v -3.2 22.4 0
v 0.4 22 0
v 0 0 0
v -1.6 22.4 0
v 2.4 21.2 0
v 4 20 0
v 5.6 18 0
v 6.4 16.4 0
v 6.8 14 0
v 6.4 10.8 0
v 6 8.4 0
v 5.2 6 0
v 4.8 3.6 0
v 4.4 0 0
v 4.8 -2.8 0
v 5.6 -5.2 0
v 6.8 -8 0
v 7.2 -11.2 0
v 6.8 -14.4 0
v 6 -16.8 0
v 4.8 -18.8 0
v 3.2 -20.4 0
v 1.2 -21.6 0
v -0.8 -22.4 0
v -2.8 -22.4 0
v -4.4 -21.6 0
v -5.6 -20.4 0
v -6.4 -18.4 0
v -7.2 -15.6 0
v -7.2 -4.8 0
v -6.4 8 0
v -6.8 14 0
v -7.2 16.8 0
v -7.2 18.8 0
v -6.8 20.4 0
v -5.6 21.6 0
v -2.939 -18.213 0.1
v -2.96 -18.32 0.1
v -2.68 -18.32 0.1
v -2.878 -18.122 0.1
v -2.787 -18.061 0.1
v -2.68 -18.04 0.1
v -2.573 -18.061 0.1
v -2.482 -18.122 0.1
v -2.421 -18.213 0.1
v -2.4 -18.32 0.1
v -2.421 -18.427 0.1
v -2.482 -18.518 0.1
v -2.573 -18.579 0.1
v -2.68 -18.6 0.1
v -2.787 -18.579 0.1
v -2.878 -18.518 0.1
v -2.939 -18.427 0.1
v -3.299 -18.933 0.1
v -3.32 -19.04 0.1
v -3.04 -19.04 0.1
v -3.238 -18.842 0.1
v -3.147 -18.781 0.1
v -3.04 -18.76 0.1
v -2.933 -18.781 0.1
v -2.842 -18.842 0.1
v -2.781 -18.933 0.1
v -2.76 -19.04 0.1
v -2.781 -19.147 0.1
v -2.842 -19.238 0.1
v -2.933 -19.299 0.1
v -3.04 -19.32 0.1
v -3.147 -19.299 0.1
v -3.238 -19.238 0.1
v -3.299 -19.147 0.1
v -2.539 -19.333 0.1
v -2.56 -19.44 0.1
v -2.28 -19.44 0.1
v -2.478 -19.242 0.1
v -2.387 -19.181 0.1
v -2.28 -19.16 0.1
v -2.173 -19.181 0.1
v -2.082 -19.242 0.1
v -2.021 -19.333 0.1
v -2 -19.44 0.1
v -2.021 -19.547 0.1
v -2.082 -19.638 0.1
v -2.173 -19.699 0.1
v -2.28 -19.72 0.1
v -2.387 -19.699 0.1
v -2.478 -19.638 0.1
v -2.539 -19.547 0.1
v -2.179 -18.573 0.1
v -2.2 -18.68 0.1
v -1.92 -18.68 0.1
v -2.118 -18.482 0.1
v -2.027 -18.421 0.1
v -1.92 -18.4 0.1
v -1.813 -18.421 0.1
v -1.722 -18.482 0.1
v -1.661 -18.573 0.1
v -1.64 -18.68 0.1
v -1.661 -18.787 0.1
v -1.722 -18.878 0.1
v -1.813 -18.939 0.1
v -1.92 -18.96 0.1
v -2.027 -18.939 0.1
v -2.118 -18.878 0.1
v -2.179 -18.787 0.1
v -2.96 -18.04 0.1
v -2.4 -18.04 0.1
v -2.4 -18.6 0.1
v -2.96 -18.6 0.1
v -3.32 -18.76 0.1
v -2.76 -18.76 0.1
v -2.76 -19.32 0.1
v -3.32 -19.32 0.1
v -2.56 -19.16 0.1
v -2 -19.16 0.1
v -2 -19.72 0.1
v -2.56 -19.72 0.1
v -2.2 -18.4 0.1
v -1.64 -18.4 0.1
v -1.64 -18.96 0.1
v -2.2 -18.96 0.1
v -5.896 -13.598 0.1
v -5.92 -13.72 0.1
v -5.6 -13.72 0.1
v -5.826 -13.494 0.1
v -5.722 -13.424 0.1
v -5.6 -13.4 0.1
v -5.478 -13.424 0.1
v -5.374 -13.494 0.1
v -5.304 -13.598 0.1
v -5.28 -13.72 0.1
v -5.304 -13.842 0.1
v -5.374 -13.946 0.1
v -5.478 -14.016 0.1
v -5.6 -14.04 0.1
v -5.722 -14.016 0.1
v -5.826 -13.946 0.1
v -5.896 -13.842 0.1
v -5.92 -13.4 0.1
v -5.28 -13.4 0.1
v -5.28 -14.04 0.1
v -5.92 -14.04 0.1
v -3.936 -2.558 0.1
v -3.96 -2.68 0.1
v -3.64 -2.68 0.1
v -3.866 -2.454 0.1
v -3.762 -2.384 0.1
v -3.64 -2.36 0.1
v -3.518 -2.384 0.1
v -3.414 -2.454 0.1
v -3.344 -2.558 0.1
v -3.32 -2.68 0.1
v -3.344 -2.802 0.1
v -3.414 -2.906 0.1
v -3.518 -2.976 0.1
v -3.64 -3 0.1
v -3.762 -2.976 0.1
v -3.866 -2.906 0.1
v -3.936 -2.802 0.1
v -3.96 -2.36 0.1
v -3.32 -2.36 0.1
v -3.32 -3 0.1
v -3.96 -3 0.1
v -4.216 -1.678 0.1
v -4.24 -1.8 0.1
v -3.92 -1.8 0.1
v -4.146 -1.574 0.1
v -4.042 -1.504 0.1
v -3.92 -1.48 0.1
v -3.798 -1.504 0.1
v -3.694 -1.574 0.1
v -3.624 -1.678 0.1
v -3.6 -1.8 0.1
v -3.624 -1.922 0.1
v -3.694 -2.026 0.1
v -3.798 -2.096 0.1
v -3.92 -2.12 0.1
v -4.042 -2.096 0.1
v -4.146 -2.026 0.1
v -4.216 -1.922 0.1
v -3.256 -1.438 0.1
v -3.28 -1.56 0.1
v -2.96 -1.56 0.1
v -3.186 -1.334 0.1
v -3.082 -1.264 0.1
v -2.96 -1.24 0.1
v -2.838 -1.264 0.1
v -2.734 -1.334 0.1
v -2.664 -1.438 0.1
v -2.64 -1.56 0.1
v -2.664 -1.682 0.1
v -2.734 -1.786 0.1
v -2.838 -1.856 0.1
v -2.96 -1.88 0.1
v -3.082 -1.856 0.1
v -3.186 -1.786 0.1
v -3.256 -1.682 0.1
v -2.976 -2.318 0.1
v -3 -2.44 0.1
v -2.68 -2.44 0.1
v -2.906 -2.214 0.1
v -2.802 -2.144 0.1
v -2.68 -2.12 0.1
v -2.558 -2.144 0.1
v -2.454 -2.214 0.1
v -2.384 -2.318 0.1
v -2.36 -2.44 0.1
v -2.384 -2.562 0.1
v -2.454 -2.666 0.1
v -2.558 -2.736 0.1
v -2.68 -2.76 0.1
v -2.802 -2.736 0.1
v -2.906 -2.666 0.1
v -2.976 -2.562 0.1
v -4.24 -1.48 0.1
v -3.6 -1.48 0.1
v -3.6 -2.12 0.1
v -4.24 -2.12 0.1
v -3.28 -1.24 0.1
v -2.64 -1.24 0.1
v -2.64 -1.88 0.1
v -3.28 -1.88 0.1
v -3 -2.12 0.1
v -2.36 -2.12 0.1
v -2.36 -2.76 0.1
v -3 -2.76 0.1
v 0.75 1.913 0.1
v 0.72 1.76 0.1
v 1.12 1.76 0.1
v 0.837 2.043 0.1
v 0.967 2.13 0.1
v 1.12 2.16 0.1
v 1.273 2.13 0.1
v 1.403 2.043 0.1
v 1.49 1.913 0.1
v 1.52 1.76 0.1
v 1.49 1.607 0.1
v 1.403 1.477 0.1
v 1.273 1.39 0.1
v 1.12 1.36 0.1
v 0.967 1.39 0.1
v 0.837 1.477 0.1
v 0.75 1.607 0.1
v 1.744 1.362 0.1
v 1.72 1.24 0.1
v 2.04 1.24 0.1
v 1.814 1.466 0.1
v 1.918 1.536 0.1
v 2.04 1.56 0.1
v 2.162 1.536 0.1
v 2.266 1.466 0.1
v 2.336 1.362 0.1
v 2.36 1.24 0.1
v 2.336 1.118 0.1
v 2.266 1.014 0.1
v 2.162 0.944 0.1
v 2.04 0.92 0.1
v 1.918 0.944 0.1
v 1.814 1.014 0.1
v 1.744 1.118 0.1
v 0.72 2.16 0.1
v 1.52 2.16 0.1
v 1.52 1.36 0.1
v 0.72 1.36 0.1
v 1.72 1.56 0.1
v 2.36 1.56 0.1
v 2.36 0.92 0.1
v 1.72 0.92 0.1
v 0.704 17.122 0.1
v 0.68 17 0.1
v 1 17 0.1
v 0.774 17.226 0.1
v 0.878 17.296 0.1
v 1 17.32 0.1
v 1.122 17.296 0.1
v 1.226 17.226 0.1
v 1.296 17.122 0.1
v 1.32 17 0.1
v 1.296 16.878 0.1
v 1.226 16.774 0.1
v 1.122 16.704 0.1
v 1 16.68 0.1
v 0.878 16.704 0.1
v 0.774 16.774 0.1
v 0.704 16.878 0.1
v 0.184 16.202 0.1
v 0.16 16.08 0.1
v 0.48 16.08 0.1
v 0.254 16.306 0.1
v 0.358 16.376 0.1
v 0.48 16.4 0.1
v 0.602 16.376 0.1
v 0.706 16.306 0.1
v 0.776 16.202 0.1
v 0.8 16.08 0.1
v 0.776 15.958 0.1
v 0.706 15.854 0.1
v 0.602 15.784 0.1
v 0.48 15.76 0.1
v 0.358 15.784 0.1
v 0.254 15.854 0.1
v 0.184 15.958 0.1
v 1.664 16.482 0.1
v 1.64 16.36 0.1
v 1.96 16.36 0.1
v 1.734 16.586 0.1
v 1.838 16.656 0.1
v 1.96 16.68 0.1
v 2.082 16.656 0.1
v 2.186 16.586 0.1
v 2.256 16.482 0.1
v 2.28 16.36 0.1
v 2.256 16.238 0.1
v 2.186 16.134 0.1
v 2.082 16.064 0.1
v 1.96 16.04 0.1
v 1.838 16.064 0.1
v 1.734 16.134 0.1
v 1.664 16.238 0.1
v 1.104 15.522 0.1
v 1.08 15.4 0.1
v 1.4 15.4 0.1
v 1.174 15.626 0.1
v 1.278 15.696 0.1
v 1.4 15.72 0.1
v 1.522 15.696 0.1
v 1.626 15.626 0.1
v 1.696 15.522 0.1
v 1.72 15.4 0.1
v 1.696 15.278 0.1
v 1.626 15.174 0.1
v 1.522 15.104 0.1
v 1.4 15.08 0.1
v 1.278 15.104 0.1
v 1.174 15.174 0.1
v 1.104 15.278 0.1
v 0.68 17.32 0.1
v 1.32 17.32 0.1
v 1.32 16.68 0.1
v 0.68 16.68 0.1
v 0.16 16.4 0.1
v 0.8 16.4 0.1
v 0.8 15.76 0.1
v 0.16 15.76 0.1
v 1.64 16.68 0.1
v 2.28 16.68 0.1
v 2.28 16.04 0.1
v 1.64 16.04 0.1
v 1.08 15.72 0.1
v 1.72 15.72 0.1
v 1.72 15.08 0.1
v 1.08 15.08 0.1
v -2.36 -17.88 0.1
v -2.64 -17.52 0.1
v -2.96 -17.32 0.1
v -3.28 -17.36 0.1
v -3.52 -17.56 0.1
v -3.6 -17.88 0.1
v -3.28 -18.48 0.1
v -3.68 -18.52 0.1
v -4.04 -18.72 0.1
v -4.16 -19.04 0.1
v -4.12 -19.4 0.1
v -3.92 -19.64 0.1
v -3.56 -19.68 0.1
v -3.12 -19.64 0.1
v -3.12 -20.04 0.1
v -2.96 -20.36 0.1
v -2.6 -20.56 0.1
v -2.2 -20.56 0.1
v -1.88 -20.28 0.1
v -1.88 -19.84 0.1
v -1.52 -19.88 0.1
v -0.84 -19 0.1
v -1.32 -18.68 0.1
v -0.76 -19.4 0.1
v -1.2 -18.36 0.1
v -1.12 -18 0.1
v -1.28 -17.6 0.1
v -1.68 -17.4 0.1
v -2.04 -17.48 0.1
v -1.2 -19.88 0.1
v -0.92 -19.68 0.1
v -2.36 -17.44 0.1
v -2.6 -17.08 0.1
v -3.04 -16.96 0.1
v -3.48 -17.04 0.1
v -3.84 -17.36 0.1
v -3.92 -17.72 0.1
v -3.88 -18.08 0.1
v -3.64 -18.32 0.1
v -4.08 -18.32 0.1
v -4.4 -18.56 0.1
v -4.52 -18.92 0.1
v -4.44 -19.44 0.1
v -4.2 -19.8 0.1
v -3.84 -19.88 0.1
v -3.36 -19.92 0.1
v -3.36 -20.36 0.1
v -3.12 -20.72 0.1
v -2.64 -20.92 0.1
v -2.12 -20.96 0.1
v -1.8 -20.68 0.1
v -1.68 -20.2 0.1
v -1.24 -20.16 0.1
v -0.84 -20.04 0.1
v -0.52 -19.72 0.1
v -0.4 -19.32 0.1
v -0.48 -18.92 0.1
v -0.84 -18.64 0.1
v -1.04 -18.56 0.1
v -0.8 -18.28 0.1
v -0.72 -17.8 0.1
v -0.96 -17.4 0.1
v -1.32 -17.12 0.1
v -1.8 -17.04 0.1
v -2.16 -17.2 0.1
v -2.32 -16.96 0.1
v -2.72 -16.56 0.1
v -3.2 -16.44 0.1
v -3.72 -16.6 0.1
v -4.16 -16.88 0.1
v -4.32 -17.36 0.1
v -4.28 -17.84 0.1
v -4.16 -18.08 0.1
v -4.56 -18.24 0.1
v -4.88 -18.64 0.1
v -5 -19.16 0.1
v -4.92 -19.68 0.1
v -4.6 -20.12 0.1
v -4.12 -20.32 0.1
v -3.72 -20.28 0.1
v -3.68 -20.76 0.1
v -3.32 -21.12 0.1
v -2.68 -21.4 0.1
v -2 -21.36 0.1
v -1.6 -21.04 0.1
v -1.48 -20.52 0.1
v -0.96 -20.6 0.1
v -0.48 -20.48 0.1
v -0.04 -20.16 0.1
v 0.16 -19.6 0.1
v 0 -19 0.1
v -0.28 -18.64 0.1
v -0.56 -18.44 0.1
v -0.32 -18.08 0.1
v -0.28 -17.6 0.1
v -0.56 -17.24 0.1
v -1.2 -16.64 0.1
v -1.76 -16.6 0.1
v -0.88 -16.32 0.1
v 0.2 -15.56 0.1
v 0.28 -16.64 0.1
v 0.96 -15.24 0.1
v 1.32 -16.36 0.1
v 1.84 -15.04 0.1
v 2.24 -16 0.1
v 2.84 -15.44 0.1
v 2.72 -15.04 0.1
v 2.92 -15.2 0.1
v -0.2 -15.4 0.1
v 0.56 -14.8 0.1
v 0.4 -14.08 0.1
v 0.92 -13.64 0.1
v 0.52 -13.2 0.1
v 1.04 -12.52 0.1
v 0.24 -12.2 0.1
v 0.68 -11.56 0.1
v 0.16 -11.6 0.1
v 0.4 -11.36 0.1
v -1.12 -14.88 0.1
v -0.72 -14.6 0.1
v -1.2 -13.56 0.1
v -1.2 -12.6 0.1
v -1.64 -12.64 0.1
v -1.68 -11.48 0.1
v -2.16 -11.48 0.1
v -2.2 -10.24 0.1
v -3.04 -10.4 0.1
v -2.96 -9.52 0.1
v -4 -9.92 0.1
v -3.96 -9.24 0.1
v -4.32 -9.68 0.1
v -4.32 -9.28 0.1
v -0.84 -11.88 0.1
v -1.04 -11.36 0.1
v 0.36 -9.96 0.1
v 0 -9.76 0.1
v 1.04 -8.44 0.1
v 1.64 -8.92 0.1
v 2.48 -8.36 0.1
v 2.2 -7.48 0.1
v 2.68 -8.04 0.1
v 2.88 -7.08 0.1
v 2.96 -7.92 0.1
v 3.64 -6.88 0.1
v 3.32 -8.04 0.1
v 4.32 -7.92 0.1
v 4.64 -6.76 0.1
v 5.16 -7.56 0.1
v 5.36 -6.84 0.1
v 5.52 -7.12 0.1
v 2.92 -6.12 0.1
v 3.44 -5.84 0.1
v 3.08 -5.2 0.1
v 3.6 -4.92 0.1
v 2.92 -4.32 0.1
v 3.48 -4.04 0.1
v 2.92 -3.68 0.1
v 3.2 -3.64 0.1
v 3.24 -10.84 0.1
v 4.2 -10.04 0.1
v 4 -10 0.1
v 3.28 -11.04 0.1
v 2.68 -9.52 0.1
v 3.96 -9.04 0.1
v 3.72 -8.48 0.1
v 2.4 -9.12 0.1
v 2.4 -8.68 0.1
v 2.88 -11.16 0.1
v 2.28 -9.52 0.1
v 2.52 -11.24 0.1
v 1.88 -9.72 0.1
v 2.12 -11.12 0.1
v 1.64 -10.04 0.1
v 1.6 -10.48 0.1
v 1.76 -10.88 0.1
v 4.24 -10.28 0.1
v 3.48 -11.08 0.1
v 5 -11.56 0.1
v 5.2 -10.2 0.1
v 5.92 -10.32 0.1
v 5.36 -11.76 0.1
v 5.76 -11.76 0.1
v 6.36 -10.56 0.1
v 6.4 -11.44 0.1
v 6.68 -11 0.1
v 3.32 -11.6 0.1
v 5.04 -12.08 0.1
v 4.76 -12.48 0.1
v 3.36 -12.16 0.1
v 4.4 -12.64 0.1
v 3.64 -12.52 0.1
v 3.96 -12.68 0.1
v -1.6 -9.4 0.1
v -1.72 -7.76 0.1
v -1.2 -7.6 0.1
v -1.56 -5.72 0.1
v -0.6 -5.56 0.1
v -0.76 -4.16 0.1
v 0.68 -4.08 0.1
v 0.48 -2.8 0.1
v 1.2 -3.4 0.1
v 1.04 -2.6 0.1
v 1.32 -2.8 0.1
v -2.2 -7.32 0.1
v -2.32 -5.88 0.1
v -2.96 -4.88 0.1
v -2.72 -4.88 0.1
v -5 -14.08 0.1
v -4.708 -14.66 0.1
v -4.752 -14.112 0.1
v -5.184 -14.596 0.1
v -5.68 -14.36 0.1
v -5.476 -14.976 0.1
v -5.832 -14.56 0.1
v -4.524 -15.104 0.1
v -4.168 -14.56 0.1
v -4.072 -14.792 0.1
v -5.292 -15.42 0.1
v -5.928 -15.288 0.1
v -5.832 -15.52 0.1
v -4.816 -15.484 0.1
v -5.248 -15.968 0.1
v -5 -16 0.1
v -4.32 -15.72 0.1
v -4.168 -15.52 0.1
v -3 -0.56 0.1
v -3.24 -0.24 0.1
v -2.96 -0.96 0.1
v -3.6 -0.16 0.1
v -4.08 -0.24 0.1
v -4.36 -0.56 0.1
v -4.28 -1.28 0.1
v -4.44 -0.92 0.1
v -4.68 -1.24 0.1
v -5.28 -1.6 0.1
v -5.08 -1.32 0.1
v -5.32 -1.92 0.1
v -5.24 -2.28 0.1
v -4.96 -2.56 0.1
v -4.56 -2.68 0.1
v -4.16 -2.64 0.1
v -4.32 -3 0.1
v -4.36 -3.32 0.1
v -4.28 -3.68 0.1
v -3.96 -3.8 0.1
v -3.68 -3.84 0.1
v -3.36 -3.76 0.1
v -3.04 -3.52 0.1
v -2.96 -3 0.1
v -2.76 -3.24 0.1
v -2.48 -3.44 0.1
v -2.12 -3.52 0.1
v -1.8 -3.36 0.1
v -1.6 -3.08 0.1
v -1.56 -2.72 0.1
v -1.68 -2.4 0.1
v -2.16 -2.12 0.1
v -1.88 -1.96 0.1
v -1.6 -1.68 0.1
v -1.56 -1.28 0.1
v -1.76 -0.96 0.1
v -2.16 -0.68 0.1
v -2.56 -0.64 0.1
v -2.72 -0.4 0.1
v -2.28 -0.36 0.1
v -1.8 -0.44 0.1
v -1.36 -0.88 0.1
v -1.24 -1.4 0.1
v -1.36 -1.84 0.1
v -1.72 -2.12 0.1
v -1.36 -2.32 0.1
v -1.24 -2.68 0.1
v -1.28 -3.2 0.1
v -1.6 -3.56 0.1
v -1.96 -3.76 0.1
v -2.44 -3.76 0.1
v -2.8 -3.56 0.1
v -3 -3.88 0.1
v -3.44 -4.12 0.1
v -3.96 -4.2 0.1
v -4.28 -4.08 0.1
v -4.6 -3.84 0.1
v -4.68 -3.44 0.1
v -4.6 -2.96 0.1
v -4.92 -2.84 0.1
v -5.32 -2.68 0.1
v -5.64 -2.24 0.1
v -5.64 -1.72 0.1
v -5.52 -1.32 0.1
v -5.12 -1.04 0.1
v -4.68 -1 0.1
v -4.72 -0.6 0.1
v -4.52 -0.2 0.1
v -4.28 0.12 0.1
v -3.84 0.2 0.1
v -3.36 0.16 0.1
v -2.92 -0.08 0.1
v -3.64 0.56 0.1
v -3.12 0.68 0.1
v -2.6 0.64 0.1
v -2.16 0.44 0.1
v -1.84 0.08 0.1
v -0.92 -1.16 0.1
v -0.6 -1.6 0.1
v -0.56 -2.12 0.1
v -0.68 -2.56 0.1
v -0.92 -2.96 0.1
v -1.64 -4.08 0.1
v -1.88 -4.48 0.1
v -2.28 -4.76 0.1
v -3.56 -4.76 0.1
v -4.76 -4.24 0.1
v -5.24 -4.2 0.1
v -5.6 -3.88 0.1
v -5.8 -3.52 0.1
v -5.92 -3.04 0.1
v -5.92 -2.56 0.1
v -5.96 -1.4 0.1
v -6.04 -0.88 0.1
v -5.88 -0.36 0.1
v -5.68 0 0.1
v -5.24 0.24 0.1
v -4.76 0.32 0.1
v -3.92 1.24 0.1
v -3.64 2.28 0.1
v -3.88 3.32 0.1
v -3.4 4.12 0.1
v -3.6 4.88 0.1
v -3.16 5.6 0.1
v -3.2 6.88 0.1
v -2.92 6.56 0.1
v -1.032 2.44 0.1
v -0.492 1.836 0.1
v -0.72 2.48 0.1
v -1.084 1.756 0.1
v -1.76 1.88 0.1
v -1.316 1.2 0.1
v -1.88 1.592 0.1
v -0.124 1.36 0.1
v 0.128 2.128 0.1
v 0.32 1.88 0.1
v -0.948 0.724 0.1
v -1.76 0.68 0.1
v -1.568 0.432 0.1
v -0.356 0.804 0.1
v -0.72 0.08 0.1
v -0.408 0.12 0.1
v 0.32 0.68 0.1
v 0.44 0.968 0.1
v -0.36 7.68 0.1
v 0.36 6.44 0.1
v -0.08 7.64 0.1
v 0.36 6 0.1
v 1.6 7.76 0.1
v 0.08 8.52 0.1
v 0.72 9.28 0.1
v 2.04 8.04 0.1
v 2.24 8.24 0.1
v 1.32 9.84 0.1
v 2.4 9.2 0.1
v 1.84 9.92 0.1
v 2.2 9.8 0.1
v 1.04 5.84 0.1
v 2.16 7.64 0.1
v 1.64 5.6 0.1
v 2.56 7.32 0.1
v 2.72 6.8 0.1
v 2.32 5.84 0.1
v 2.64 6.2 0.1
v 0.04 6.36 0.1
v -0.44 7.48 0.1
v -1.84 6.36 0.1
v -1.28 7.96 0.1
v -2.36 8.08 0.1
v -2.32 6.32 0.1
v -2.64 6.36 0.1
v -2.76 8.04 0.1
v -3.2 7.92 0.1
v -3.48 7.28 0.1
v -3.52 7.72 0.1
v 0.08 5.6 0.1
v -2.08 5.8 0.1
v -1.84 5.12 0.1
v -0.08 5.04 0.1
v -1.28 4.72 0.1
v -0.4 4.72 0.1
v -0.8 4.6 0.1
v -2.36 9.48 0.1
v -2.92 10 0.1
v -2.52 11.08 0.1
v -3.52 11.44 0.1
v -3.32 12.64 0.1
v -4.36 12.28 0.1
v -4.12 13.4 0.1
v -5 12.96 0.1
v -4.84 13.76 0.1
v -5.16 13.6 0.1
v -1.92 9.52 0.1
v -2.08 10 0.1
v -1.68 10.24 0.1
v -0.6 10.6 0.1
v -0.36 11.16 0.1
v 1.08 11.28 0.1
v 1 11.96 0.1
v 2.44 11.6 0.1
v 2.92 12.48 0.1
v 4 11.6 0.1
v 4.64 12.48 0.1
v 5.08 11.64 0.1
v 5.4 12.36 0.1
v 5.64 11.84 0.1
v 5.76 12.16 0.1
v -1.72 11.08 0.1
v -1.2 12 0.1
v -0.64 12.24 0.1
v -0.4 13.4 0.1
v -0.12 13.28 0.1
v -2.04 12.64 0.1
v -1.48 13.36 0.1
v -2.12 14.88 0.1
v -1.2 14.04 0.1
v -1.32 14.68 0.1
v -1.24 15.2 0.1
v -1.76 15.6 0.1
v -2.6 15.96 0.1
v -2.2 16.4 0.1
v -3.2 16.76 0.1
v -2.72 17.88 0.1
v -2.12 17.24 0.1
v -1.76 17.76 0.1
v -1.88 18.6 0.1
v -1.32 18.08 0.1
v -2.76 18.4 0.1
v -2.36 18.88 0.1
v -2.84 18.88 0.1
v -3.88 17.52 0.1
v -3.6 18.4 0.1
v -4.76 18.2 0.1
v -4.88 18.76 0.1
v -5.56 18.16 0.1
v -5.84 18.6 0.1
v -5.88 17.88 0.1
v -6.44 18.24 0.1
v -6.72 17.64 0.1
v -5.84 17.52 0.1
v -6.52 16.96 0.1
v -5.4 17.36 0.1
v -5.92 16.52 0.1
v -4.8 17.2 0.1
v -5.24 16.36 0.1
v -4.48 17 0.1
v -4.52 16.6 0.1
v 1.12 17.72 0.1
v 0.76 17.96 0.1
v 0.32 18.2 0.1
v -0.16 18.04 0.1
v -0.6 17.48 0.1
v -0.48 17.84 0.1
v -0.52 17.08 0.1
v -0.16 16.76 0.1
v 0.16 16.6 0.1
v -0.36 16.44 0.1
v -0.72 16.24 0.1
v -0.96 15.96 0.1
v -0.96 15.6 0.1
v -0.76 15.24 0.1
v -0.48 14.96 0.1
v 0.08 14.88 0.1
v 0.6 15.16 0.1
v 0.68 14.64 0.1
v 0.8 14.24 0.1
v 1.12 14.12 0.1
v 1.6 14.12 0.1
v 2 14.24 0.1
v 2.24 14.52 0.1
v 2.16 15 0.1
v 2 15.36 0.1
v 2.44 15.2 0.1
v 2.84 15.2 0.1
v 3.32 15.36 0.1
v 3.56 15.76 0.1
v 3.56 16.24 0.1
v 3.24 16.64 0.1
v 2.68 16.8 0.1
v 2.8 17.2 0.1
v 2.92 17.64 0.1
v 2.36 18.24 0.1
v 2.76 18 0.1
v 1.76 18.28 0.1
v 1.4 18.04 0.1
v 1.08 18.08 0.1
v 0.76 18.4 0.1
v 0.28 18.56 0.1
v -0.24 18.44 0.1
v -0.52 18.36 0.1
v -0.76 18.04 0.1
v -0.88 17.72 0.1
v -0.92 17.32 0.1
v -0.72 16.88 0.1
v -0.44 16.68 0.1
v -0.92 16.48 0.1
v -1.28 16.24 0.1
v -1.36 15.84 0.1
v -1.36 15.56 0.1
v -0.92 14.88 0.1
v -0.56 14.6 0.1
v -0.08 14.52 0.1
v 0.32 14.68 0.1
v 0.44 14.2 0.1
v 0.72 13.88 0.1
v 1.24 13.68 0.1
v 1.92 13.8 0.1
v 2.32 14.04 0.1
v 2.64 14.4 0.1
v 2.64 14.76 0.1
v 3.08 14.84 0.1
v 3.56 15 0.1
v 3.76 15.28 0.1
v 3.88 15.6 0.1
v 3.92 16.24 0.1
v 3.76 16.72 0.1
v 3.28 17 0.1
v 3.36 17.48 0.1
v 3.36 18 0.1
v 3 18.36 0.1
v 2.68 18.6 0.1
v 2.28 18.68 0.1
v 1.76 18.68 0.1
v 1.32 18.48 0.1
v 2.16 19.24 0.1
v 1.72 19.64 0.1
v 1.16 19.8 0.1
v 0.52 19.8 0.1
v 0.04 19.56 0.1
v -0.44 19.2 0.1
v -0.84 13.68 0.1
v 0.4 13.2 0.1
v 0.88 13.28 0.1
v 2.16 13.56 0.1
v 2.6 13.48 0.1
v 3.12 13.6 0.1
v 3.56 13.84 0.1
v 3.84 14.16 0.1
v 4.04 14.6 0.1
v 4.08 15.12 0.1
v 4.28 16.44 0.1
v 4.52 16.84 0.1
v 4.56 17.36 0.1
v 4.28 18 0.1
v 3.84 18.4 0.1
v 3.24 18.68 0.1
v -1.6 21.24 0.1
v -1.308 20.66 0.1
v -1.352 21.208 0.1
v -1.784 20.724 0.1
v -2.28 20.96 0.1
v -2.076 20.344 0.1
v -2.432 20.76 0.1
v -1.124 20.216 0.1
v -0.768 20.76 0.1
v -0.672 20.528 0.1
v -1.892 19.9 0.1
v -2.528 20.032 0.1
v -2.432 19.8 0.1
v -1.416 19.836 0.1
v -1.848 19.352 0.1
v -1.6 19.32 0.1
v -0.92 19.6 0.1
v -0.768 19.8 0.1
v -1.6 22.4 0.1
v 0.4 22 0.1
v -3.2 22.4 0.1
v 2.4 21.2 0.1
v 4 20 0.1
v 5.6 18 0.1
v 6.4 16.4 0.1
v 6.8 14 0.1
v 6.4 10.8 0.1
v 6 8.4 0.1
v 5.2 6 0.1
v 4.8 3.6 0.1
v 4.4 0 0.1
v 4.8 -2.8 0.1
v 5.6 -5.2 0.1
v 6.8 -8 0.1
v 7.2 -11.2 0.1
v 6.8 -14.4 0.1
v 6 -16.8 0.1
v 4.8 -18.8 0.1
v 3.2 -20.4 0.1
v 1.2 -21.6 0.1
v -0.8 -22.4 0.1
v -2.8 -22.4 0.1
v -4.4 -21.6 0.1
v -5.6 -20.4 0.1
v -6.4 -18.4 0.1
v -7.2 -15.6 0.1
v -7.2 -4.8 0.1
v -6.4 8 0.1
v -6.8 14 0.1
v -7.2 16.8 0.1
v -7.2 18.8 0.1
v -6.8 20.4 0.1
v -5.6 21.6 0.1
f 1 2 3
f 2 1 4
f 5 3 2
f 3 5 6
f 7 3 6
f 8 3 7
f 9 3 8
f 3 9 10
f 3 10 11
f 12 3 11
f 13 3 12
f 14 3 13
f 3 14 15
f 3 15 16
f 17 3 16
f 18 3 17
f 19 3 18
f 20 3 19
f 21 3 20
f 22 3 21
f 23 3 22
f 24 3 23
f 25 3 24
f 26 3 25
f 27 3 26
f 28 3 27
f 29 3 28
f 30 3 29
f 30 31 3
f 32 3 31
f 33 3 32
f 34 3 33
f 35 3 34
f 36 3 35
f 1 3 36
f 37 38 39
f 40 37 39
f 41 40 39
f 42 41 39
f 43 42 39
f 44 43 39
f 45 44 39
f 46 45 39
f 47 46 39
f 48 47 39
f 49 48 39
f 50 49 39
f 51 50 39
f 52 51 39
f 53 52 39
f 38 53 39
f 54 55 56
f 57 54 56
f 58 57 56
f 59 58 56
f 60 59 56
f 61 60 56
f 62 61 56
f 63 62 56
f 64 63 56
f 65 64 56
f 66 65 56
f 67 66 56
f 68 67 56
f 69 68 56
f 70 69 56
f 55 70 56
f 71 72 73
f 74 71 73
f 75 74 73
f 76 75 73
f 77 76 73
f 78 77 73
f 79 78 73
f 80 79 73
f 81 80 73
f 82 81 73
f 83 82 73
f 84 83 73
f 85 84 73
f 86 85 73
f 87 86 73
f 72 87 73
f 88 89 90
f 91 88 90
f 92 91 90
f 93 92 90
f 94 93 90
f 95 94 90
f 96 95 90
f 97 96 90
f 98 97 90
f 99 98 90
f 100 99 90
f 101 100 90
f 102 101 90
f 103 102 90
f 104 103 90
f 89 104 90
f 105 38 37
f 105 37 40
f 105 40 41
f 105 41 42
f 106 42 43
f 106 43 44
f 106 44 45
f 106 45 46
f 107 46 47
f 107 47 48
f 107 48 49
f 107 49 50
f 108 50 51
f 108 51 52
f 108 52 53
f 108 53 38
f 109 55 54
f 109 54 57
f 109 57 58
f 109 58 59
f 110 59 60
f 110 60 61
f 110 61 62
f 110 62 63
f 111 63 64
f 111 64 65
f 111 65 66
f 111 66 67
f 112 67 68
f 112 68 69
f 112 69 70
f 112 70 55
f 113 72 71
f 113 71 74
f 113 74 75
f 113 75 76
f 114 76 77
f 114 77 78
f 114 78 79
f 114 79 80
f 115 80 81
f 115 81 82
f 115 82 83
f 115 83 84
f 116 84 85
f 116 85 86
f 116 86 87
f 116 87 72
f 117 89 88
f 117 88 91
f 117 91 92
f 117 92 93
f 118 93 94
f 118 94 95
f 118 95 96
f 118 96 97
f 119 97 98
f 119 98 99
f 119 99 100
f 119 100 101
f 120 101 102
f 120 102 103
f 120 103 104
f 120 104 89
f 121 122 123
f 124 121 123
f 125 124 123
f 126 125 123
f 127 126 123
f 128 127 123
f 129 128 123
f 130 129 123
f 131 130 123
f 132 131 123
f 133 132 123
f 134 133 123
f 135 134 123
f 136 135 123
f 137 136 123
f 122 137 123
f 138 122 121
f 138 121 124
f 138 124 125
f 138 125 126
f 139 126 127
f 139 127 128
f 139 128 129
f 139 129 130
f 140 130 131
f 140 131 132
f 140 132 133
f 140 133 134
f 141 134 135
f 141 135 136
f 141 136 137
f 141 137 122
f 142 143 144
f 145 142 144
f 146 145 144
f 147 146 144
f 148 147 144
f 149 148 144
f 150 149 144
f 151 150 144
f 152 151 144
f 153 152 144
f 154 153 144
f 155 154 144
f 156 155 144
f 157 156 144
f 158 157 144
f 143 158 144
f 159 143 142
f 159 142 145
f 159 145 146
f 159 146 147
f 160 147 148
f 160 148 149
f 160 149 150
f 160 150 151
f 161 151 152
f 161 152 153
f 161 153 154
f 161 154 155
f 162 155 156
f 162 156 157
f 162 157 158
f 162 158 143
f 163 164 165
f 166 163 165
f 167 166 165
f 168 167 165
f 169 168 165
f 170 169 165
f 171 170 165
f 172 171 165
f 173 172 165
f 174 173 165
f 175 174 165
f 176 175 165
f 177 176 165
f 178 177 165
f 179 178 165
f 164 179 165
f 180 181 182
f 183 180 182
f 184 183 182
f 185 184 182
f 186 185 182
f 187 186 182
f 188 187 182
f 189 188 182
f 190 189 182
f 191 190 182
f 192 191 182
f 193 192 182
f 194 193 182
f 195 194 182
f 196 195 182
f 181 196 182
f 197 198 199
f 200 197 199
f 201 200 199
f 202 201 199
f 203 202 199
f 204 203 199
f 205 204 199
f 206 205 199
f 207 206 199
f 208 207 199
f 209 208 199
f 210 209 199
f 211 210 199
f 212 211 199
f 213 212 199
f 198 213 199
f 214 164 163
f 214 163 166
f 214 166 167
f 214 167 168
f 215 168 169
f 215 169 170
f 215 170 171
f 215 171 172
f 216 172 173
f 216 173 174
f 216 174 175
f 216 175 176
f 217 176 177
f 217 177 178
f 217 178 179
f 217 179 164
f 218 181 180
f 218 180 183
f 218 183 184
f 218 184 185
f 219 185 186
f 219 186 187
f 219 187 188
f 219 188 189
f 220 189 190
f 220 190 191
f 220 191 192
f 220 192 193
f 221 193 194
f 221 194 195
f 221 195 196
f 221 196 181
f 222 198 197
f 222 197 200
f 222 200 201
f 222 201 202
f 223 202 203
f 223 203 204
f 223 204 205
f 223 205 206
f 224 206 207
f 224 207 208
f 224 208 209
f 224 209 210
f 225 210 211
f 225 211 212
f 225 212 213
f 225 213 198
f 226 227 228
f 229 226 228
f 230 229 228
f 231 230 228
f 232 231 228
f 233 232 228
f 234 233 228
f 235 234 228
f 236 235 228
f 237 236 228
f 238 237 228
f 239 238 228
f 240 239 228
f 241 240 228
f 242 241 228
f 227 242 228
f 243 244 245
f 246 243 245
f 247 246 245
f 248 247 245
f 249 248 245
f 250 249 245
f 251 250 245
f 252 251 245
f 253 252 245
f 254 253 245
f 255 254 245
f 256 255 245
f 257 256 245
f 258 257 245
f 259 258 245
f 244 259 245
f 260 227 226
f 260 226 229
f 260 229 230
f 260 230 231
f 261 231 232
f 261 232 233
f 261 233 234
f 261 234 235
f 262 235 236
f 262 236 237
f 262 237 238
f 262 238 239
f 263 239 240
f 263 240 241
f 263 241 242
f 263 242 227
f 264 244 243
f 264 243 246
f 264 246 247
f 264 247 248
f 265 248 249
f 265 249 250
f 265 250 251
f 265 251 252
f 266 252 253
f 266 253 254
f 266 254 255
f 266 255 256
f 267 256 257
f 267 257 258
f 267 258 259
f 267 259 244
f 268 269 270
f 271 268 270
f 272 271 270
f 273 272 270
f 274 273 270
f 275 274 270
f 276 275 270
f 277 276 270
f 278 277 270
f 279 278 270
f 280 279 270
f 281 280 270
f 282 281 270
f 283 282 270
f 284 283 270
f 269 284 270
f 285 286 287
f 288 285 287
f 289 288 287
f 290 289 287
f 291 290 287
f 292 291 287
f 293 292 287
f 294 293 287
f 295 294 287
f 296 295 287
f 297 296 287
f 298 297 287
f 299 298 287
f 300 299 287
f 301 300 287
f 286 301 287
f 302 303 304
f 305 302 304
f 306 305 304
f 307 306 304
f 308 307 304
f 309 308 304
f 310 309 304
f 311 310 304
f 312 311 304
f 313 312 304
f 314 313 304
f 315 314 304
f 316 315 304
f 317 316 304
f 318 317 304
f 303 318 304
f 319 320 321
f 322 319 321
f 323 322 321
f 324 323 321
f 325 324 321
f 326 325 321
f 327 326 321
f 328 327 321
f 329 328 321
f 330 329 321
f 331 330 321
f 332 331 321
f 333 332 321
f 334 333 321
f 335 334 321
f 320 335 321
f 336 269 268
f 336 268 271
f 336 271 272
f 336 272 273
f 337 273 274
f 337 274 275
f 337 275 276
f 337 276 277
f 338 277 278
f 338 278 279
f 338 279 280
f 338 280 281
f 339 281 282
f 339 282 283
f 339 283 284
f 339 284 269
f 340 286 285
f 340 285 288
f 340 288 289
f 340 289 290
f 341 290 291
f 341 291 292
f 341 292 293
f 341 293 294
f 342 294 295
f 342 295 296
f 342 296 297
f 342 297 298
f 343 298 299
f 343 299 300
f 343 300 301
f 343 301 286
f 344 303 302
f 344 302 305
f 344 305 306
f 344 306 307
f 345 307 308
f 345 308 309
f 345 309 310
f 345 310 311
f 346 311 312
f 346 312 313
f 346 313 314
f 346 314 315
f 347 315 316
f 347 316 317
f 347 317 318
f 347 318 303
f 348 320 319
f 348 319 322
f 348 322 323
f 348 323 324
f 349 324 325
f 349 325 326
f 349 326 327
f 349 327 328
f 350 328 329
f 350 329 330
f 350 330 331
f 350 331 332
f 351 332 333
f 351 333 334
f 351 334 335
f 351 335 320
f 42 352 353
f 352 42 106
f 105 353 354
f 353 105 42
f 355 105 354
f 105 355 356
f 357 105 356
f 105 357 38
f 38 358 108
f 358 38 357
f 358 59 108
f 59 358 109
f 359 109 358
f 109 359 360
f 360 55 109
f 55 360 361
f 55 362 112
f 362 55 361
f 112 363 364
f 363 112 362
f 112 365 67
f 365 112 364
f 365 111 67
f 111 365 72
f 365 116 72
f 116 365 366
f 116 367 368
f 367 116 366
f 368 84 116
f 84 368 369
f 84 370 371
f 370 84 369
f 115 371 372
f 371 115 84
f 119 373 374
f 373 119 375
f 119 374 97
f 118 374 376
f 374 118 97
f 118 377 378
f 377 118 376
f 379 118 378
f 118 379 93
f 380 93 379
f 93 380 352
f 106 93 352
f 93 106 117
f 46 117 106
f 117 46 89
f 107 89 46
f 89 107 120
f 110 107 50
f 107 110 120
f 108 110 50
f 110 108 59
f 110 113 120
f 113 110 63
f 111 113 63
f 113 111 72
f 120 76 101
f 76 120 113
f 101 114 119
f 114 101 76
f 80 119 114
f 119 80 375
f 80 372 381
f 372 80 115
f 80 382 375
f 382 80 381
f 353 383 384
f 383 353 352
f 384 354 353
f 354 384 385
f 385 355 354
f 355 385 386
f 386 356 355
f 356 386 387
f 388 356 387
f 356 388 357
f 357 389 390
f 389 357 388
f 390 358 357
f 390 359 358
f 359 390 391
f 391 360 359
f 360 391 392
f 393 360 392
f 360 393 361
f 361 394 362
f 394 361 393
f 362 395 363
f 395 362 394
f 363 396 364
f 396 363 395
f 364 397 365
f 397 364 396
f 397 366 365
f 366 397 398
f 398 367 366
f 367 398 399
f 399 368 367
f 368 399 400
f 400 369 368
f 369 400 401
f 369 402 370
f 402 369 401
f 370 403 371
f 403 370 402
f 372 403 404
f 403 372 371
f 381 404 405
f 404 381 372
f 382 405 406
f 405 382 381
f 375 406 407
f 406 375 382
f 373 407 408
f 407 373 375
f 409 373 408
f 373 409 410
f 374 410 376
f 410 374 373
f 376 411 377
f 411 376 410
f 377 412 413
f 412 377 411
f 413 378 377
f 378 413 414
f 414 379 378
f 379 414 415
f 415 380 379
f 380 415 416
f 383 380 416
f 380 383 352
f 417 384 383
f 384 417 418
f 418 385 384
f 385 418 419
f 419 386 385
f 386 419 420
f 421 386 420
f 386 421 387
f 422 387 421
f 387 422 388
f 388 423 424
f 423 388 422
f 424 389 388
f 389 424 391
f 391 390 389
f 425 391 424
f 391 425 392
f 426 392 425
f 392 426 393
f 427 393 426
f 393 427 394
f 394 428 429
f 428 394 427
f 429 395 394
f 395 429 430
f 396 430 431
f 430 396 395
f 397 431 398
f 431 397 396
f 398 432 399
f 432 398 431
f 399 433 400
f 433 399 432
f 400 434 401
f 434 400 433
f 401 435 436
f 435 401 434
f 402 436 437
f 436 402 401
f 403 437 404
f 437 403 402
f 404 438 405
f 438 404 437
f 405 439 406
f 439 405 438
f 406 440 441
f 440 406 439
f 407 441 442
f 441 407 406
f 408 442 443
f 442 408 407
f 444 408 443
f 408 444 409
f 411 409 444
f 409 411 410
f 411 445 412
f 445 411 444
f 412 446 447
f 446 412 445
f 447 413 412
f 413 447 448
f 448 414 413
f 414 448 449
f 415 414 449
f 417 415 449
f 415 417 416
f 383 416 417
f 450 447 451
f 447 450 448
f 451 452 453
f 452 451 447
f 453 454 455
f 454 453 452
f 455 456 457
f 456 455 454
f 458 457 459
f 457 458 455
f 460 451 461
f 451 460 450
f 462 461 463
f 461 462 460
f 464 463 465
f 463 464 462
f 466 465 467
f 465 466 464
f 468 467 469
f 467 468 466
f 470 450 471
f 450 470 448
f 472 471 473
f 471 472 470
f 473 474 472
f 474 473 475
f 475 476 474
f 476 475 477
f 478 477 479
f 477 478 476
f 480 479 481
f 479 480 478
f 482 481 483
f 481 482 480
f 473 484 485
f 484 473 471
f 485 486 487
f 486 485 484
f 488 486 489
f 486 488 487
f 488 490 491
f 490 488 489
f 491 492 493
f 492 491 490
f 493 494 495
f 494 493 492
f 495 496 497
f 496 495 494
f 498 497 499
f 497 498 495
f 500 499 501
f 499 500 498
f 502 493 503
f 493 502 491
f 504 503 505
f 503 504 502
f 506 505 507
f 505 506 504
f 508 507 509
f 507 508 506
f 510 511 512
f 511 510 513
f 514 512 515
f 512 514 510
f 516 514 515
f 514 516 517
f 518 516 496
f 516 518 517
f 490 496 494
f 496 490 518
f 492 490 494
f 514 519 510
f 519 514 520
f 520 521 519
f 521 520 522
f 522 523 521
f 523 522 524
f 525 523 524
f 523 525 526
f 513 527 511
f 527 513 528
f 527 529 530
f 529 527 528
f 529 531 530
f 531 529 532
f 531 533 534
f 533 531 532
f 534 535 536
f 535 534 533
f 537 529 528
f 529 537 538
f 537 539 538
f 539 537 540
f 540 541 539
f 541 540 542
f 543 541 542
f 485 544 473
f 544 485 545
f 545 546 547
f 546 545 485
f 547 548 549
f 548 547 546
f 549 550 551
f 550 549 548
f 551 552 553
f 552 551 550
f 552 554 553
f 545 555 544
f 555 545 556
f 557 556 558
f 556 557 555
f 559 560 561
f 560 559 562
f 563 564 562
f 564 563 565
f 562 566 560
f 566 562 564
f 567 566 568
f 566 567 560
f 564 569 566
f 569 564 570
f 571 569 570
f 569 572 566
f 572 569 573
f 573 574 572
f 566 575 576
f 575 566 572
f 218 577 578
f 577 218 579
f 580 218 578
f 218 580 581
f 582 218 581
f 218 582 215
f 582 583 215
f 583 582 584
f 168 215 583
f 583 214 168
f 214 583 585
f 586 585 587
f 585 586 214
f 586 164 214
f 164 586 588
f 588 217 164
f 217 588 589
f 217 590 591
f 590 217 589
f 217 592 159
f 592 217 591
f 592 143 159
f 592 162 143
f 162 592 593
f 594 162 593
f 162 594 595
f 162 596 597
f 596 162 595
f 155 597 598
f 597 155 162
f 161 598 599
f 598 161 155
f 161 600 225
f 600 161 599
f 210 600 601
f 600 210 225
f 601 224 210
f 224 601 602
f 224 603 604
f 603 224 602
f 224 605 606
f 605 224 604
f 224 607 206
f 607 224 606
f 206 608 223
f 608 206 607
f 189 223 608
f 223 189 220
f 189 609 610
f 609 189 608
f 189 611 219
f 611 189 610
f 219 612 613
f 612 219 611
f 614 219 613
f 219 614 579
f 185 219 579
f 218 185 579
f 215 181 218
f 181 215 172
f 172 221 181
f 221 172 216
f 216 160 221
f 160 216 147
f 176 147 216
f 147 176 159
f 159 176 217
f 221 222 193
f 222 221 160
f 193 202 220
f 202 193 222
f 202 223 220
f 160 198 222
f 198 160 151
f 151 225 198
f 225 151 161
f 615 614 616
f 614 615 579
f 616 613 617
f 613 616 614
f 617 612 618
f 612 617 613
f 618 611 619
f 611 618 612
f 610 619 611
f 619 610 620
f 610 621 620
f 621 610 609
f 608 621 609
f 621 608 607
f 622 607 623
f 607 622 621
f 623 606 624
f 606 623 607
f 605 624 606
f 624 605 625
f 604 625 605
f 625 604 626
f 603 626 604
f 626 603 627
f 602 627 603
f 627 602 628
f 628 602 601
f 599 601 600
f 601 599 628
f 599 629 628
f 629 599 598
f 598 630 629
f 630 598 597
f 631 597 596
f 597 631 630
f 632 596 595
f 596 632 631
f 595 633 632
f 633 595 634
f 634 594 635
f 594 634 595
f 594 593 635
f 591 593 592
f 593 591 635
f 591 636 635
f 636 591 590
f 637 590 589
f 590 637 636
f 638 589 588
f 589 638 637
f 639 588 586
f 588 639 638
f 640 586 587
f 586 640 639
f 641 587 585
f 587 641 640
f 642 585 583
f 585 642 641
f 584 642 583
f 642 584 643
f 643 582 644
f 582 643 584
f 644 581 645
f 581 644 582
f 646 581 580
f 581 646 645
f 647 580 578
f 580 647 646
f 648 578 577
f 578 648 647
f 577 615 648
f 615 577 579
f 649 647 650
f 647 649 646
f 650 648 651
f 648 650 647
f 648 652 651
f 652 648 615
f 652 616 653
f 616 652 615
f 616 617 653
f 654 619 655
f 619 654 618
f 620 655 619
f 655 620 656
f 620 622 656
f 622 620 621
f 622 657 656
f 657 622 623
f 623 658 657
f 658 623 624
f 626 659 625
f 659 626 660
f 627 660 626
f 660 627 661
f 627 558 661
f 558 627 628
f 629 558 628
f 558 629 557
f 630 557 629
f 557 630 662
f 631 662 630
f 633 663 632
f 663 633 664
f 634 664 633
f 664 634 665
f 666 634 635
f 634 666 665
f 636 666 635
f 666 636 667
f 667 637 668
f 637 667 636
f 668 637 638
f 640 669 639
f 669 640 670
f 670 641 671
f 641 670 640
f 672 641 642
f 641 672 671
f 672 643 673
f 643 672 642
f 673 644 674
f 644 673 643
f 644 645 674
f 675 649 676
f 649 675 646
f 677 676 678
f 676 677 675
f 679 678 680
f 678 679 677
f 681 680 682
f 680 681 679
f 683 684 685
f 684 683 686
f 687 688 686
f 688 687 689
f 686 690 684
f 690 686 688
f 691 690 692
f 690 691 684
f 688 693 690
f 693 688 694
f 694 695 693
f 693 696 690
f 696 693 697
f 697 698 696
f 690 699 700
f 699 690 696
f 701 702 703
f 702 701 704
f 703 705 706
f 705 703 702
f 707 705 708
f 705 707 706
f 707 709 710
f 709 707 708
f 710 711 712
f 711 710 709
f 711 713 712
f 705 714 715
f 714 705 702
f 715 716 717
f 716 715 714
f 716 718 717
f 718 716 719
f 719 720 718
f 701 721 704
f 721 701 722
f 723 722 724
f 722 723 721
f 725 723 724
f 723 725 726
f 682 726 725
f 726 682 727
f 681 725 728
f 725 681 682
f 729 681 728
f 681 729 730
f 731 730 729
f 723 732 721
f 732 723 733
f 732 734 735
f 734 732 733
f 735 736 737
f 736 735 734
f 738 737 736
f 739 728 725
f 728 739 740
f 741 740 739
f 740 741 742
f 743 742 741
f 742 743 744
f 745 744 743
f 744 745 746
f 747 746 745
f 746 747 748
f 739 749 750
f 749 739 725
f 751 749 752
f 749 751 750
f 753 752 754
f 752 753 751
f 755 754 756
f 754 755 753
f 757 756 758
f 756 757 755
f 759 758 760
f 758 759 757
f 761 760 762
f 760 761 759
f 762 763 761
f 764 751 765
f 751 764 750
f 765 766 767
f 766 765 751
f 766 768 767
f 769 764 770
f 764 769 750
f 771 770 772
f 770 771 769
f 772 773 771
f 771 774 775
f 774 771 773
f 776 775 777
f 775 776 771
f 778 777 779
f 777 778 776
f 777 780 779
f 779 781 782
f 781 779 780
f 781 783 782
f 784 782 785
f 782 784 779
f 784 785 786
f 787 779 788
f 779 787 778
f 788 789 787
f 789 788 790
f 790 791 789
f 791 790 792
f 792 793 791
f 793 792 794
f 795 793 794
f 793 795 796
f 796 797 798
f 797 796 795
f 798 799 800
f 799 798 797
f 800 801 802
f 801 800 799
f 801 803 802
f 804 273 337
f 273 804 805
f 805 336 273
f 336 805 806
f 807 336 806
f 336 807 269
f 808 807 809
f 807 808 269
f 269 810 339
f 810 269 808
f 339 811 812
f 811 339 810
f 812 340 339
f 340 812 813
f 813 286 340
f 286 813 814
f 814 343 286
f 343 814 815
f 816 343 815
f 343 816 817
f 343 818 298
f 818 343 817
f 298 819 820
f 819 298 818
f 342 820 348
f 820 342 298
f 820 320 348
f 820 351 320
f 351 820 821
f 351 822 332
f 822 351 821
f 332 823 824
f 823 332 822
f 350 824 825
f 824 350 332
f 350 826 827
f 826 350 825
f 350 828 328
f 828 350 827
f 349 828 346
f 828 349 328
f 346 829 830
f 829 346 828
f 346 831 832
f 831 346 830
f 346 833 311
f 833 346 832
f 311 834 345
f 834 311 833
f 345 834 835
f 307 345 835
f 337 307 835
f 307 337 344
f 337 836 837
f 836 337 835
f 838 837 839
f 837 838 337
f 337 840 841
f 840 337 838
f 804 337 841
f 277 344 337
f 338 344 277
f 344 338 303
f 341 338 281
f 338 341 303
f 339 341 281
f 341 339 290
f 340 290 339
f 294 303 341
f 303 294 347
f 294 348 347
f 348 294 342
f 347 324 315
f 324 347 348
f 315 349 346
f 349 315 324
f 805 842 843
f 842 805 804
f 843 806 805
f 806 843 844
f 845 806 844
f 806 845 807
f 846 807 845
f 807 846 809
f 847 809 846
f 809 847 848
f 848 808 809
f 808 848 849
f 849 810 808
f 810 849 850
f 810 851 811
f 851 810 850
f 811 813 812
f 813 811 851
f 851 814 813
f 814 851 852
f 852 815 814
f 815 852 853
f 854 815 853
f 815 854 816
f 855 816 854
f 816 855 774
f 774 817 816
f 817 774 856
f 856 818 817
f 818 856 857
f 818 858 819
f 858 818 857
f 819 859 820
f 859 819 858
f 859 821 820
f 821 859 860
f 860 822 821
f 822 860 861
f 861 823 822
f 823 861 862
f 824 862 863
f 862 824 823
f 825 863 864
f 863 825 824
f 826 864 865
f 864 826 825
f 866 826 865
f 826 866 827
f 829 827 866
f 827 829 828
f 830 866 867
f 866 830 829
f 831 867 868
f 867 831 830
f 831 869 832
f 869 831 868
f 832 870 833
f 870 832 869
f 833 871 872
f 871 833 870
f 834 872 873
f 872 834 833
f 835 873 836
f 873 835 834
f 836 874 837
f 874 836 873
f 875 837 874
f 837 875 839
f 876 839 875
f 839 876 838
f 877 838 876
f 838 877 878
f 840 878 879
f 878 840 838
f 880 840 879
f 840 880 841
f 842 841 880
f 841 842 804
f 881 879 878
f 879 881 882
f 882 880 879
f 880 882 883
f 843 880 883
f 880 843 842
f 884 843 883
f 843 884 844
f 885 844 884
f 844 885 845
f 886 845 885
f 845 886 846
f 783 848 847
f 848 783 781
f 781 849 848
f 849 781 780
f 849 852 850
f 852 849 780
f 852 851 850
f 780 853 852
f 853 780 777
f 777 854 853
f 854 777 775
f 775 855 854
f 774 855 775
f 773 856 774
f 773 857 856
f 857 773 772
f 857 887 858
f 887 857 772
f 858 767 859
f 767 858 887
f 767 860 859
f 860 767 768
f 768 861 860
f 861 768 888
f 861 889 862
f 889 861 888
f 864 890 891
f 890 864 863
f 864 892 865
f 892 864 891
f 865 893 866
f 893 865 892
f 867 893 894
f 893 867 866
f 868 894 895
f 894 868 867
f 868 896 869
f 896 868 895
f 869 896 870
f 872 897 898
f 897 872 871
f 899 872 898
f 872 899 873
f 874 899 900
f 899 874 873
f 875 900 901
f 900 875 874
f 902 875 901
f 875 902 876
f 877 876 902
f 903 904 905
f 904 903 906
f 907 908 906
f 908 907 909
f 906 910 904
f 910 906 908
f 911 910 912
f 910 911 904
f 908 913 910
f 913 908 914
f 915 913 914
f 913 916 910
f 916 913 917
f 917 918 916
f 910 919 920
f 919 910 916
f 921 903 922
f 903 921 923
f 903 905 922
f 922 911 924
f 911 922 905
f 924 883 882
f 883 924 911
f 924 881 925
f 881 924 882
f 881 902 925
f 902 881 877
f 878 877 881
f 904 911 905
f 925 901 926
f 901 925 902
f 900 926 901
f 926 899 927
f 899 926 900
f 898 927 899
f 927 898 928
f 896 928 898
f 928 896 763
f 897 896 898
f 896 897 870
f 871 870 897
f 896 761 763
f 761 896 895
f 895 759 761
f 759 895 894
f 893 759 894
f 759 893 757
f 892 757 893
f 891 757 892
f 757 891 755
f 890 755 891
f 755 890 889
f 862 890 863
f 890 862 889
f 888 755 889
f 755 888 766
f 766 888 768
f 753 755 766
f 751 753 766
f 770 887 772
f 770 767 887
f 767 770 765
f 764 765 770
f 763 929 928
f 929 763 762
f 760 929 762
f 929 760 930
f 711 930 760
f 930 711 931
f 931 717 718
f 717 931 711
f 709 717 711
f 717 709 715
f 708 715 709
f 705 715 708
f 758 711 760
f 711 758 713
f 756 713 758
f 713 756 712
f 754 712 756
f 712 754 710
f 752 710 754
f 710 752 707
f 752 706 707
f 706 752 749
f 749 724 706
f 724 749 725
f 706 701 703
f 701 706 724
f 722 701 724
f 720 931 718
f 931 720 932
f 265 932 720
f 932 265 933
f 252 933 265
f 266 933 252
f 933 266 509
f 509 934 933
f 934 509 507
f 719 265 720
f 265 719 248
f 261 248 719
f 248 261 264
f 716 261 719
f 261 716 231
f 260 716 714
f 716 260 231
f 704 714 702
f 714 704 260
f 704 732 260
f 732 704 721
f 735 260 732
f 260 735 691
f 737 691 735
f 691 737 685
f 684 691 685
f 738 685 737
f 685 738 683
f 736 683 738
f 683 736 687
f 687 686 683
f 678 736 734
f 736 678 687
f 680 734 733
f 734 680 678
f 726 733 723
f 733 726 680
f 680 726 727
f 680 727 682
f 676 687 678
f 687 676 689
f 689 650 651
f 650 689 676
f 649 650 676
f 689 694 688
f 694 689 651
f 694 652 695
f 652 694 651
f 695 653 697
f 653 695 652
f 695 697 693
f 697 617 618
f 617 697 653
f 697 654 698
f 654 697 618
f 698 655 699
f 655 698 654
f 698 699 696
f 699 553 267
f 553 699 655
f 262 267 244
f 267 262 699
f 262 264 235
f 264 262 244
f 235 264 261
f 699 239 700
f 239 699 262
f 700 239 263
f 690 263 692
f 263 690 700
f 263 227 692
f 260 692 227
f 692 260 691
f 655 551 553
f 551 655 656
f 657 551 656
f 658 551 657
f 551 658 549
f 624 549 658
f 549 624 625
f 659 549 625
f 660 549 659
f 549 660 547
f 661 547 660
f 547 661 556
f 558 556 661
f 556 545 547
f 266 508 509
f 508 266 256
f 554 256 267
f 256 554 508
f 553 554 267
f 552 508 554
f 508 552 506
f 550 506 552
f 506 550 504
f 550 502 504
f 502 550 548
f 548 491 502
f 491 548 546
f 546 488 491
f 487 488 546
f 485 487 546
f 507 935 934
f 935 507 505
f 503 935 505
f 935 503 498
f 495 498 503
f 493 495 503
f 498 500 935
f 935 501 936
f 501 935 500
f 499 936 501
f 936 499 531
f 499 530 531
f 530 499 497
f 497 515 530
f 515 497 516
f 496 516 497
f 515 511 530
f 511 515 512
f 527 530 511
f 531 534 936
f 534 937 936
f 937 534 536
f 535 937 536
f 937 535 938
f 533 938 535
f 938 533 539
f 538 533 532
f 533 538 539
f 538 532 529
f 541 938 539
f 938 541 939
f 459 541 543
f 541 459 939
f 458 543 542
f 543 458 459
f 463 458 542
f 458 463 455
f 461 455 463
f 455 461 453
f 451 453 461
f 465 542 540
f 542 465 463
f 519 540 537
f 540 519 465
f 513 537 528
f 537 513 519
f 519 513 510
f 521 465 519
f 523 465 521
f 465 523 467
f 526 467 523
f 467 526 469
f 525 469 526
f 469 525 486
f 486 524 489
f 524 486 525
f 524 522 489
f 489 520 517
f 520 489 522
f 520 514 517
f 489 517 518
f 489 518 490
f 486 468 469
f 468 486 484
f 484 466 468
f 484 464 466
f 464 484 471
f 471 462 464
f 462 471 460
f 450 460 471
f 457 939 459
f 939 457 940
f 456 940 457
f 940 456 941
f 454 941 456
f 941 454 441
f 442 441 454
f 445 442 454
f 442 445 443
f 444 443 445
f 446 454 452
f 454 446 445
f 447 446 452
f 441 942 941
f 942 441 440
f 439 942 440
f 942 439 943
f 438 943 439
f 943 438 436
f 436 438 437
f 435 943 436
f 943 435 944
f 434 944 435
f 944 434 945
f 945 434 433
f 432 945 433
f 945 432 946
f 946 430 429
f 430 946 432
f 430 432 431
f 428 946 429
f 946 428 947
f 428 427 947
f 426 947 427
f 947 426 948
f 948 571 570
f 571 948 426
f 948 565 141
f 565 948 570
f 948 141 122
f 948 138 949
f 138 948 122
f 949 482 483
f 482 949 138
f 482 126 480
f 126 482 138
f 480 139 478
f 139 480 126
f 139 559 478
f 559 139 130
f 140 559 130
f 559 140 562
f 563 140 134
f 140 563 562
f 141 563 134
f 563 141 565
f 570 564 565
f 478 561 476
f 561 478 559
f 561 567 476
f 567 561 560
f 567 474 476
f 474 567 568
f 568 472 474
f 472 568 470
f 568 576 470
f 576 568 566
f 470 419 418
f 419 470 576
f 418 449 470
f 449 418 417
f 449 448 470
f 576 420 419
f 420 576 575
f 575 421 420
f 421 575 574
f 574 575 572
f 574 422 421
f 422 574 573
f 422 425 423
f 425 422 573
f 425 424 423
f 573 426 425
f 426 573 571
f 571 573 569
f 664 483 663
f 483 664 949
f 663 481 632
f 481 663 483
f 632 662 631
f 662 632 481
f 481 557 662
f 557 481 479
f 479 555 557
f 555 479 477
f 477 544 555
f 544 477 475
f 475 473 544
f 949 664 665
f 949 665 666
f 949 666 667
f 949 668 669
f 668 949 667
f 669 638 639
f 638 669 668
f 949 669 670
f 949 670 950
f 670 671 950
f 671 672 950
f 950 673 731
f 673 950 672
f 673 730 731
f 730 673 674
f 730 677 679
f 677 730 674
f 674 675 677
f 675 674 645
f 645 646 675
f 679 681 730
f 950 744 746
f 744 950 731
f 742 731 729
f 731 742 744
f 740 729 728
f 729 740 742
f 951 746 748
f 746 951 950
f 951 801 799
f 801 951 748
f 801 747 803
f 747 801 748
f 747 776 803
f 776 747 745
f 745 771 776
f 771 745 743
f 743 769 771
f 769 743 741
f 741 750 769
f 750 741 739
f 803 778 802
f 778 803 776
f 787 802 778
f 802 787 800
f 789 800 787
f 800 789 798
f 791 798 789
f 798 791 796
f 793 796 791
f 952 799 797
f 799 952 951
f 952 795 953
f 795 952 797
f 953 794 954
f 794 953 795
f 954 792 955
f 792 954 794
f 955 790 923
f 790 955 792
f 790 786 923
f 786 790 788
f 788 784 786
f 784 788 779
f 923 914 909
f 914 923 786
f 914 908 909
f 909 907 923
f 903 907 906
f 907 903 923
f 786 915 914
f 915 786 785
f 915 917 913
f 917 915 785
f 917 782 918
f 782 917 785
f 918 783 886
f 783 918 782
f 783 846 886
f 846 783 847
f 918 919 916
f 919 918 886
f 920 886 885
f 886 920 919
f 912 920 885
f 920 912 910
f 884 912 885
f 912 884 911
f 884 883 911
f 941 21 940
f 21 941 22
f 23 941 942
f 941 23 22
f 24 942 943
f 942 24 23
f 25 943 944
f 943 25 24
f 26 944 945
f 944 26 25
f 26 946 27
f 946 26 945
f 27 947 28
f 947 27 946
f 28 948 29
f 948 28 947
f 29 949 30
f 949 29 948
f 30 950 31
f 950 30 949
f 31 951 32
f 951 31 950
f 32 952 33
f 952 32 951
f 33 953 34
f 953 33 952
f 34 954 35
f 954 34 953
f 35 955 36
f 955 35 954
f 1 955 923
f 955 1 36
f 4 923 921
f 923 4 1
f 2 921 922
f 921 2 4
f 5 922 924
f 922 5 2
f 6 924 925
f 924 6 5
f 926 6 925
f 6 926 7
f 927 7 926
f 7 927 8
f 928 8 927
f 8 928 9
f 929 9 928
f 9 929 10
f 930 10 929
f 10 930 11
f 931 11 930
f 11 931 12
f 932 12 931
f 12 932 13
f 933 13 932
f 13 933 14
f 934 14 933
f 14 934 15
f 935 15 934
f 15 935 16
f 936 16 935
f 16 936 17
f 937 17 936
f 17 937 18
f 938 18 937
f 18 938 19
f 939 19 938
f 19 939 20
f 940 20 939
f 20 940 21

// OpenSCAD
use <../lib.scad>
use <4620860m.scad>
function ldraw_lib__4620860n() = [
// 0 Sticker  5.6 x  1.8 with Flowers and Butterflies Right
// 0 Name: 4620860n.dat
// 0 Author: Takeshi Takahashi [RainbowDolphin]
// 0 !LDRAW_ORG Part UPDATE 2025-01
// 0 !LICENSE Licensed under CC BY 4.0 : see CAreadme.txt
// 
// 0 BFC CERTIFY CCW
  [0,"BFC","CERTIFY"],
  [0,"BFC","CCW"],
// 
// 0 !KEYWORDS Bricklink 3315stk01, Brickowl 604777, house, Olivia
// 0 !KEYWORDS Rebrickable 95460, set 3315
// 
// 0 !HISTORY 2025-01-20 [OrionP] Official Update 2025-01
// 
// 
// 1 16 0 0 0 -1 0 0 0 1 0 0 0 1 4620860m.dat
  [1,16,0,0,0,-1,0,0,0,1,0,0,0,1, ldraw_lib__4620860m()],
];
module ldraw_lib__4620860n(step=0, col=false, unit=2/5, alt=false, line=0.2, solid=!$preview)
    makepoly(ldraw_lib__4620860n(), step=step, col=col, unit=unit, alt=alt, line=line, solid=solid);
ldraw_lib__4620860n(line=0.2);
